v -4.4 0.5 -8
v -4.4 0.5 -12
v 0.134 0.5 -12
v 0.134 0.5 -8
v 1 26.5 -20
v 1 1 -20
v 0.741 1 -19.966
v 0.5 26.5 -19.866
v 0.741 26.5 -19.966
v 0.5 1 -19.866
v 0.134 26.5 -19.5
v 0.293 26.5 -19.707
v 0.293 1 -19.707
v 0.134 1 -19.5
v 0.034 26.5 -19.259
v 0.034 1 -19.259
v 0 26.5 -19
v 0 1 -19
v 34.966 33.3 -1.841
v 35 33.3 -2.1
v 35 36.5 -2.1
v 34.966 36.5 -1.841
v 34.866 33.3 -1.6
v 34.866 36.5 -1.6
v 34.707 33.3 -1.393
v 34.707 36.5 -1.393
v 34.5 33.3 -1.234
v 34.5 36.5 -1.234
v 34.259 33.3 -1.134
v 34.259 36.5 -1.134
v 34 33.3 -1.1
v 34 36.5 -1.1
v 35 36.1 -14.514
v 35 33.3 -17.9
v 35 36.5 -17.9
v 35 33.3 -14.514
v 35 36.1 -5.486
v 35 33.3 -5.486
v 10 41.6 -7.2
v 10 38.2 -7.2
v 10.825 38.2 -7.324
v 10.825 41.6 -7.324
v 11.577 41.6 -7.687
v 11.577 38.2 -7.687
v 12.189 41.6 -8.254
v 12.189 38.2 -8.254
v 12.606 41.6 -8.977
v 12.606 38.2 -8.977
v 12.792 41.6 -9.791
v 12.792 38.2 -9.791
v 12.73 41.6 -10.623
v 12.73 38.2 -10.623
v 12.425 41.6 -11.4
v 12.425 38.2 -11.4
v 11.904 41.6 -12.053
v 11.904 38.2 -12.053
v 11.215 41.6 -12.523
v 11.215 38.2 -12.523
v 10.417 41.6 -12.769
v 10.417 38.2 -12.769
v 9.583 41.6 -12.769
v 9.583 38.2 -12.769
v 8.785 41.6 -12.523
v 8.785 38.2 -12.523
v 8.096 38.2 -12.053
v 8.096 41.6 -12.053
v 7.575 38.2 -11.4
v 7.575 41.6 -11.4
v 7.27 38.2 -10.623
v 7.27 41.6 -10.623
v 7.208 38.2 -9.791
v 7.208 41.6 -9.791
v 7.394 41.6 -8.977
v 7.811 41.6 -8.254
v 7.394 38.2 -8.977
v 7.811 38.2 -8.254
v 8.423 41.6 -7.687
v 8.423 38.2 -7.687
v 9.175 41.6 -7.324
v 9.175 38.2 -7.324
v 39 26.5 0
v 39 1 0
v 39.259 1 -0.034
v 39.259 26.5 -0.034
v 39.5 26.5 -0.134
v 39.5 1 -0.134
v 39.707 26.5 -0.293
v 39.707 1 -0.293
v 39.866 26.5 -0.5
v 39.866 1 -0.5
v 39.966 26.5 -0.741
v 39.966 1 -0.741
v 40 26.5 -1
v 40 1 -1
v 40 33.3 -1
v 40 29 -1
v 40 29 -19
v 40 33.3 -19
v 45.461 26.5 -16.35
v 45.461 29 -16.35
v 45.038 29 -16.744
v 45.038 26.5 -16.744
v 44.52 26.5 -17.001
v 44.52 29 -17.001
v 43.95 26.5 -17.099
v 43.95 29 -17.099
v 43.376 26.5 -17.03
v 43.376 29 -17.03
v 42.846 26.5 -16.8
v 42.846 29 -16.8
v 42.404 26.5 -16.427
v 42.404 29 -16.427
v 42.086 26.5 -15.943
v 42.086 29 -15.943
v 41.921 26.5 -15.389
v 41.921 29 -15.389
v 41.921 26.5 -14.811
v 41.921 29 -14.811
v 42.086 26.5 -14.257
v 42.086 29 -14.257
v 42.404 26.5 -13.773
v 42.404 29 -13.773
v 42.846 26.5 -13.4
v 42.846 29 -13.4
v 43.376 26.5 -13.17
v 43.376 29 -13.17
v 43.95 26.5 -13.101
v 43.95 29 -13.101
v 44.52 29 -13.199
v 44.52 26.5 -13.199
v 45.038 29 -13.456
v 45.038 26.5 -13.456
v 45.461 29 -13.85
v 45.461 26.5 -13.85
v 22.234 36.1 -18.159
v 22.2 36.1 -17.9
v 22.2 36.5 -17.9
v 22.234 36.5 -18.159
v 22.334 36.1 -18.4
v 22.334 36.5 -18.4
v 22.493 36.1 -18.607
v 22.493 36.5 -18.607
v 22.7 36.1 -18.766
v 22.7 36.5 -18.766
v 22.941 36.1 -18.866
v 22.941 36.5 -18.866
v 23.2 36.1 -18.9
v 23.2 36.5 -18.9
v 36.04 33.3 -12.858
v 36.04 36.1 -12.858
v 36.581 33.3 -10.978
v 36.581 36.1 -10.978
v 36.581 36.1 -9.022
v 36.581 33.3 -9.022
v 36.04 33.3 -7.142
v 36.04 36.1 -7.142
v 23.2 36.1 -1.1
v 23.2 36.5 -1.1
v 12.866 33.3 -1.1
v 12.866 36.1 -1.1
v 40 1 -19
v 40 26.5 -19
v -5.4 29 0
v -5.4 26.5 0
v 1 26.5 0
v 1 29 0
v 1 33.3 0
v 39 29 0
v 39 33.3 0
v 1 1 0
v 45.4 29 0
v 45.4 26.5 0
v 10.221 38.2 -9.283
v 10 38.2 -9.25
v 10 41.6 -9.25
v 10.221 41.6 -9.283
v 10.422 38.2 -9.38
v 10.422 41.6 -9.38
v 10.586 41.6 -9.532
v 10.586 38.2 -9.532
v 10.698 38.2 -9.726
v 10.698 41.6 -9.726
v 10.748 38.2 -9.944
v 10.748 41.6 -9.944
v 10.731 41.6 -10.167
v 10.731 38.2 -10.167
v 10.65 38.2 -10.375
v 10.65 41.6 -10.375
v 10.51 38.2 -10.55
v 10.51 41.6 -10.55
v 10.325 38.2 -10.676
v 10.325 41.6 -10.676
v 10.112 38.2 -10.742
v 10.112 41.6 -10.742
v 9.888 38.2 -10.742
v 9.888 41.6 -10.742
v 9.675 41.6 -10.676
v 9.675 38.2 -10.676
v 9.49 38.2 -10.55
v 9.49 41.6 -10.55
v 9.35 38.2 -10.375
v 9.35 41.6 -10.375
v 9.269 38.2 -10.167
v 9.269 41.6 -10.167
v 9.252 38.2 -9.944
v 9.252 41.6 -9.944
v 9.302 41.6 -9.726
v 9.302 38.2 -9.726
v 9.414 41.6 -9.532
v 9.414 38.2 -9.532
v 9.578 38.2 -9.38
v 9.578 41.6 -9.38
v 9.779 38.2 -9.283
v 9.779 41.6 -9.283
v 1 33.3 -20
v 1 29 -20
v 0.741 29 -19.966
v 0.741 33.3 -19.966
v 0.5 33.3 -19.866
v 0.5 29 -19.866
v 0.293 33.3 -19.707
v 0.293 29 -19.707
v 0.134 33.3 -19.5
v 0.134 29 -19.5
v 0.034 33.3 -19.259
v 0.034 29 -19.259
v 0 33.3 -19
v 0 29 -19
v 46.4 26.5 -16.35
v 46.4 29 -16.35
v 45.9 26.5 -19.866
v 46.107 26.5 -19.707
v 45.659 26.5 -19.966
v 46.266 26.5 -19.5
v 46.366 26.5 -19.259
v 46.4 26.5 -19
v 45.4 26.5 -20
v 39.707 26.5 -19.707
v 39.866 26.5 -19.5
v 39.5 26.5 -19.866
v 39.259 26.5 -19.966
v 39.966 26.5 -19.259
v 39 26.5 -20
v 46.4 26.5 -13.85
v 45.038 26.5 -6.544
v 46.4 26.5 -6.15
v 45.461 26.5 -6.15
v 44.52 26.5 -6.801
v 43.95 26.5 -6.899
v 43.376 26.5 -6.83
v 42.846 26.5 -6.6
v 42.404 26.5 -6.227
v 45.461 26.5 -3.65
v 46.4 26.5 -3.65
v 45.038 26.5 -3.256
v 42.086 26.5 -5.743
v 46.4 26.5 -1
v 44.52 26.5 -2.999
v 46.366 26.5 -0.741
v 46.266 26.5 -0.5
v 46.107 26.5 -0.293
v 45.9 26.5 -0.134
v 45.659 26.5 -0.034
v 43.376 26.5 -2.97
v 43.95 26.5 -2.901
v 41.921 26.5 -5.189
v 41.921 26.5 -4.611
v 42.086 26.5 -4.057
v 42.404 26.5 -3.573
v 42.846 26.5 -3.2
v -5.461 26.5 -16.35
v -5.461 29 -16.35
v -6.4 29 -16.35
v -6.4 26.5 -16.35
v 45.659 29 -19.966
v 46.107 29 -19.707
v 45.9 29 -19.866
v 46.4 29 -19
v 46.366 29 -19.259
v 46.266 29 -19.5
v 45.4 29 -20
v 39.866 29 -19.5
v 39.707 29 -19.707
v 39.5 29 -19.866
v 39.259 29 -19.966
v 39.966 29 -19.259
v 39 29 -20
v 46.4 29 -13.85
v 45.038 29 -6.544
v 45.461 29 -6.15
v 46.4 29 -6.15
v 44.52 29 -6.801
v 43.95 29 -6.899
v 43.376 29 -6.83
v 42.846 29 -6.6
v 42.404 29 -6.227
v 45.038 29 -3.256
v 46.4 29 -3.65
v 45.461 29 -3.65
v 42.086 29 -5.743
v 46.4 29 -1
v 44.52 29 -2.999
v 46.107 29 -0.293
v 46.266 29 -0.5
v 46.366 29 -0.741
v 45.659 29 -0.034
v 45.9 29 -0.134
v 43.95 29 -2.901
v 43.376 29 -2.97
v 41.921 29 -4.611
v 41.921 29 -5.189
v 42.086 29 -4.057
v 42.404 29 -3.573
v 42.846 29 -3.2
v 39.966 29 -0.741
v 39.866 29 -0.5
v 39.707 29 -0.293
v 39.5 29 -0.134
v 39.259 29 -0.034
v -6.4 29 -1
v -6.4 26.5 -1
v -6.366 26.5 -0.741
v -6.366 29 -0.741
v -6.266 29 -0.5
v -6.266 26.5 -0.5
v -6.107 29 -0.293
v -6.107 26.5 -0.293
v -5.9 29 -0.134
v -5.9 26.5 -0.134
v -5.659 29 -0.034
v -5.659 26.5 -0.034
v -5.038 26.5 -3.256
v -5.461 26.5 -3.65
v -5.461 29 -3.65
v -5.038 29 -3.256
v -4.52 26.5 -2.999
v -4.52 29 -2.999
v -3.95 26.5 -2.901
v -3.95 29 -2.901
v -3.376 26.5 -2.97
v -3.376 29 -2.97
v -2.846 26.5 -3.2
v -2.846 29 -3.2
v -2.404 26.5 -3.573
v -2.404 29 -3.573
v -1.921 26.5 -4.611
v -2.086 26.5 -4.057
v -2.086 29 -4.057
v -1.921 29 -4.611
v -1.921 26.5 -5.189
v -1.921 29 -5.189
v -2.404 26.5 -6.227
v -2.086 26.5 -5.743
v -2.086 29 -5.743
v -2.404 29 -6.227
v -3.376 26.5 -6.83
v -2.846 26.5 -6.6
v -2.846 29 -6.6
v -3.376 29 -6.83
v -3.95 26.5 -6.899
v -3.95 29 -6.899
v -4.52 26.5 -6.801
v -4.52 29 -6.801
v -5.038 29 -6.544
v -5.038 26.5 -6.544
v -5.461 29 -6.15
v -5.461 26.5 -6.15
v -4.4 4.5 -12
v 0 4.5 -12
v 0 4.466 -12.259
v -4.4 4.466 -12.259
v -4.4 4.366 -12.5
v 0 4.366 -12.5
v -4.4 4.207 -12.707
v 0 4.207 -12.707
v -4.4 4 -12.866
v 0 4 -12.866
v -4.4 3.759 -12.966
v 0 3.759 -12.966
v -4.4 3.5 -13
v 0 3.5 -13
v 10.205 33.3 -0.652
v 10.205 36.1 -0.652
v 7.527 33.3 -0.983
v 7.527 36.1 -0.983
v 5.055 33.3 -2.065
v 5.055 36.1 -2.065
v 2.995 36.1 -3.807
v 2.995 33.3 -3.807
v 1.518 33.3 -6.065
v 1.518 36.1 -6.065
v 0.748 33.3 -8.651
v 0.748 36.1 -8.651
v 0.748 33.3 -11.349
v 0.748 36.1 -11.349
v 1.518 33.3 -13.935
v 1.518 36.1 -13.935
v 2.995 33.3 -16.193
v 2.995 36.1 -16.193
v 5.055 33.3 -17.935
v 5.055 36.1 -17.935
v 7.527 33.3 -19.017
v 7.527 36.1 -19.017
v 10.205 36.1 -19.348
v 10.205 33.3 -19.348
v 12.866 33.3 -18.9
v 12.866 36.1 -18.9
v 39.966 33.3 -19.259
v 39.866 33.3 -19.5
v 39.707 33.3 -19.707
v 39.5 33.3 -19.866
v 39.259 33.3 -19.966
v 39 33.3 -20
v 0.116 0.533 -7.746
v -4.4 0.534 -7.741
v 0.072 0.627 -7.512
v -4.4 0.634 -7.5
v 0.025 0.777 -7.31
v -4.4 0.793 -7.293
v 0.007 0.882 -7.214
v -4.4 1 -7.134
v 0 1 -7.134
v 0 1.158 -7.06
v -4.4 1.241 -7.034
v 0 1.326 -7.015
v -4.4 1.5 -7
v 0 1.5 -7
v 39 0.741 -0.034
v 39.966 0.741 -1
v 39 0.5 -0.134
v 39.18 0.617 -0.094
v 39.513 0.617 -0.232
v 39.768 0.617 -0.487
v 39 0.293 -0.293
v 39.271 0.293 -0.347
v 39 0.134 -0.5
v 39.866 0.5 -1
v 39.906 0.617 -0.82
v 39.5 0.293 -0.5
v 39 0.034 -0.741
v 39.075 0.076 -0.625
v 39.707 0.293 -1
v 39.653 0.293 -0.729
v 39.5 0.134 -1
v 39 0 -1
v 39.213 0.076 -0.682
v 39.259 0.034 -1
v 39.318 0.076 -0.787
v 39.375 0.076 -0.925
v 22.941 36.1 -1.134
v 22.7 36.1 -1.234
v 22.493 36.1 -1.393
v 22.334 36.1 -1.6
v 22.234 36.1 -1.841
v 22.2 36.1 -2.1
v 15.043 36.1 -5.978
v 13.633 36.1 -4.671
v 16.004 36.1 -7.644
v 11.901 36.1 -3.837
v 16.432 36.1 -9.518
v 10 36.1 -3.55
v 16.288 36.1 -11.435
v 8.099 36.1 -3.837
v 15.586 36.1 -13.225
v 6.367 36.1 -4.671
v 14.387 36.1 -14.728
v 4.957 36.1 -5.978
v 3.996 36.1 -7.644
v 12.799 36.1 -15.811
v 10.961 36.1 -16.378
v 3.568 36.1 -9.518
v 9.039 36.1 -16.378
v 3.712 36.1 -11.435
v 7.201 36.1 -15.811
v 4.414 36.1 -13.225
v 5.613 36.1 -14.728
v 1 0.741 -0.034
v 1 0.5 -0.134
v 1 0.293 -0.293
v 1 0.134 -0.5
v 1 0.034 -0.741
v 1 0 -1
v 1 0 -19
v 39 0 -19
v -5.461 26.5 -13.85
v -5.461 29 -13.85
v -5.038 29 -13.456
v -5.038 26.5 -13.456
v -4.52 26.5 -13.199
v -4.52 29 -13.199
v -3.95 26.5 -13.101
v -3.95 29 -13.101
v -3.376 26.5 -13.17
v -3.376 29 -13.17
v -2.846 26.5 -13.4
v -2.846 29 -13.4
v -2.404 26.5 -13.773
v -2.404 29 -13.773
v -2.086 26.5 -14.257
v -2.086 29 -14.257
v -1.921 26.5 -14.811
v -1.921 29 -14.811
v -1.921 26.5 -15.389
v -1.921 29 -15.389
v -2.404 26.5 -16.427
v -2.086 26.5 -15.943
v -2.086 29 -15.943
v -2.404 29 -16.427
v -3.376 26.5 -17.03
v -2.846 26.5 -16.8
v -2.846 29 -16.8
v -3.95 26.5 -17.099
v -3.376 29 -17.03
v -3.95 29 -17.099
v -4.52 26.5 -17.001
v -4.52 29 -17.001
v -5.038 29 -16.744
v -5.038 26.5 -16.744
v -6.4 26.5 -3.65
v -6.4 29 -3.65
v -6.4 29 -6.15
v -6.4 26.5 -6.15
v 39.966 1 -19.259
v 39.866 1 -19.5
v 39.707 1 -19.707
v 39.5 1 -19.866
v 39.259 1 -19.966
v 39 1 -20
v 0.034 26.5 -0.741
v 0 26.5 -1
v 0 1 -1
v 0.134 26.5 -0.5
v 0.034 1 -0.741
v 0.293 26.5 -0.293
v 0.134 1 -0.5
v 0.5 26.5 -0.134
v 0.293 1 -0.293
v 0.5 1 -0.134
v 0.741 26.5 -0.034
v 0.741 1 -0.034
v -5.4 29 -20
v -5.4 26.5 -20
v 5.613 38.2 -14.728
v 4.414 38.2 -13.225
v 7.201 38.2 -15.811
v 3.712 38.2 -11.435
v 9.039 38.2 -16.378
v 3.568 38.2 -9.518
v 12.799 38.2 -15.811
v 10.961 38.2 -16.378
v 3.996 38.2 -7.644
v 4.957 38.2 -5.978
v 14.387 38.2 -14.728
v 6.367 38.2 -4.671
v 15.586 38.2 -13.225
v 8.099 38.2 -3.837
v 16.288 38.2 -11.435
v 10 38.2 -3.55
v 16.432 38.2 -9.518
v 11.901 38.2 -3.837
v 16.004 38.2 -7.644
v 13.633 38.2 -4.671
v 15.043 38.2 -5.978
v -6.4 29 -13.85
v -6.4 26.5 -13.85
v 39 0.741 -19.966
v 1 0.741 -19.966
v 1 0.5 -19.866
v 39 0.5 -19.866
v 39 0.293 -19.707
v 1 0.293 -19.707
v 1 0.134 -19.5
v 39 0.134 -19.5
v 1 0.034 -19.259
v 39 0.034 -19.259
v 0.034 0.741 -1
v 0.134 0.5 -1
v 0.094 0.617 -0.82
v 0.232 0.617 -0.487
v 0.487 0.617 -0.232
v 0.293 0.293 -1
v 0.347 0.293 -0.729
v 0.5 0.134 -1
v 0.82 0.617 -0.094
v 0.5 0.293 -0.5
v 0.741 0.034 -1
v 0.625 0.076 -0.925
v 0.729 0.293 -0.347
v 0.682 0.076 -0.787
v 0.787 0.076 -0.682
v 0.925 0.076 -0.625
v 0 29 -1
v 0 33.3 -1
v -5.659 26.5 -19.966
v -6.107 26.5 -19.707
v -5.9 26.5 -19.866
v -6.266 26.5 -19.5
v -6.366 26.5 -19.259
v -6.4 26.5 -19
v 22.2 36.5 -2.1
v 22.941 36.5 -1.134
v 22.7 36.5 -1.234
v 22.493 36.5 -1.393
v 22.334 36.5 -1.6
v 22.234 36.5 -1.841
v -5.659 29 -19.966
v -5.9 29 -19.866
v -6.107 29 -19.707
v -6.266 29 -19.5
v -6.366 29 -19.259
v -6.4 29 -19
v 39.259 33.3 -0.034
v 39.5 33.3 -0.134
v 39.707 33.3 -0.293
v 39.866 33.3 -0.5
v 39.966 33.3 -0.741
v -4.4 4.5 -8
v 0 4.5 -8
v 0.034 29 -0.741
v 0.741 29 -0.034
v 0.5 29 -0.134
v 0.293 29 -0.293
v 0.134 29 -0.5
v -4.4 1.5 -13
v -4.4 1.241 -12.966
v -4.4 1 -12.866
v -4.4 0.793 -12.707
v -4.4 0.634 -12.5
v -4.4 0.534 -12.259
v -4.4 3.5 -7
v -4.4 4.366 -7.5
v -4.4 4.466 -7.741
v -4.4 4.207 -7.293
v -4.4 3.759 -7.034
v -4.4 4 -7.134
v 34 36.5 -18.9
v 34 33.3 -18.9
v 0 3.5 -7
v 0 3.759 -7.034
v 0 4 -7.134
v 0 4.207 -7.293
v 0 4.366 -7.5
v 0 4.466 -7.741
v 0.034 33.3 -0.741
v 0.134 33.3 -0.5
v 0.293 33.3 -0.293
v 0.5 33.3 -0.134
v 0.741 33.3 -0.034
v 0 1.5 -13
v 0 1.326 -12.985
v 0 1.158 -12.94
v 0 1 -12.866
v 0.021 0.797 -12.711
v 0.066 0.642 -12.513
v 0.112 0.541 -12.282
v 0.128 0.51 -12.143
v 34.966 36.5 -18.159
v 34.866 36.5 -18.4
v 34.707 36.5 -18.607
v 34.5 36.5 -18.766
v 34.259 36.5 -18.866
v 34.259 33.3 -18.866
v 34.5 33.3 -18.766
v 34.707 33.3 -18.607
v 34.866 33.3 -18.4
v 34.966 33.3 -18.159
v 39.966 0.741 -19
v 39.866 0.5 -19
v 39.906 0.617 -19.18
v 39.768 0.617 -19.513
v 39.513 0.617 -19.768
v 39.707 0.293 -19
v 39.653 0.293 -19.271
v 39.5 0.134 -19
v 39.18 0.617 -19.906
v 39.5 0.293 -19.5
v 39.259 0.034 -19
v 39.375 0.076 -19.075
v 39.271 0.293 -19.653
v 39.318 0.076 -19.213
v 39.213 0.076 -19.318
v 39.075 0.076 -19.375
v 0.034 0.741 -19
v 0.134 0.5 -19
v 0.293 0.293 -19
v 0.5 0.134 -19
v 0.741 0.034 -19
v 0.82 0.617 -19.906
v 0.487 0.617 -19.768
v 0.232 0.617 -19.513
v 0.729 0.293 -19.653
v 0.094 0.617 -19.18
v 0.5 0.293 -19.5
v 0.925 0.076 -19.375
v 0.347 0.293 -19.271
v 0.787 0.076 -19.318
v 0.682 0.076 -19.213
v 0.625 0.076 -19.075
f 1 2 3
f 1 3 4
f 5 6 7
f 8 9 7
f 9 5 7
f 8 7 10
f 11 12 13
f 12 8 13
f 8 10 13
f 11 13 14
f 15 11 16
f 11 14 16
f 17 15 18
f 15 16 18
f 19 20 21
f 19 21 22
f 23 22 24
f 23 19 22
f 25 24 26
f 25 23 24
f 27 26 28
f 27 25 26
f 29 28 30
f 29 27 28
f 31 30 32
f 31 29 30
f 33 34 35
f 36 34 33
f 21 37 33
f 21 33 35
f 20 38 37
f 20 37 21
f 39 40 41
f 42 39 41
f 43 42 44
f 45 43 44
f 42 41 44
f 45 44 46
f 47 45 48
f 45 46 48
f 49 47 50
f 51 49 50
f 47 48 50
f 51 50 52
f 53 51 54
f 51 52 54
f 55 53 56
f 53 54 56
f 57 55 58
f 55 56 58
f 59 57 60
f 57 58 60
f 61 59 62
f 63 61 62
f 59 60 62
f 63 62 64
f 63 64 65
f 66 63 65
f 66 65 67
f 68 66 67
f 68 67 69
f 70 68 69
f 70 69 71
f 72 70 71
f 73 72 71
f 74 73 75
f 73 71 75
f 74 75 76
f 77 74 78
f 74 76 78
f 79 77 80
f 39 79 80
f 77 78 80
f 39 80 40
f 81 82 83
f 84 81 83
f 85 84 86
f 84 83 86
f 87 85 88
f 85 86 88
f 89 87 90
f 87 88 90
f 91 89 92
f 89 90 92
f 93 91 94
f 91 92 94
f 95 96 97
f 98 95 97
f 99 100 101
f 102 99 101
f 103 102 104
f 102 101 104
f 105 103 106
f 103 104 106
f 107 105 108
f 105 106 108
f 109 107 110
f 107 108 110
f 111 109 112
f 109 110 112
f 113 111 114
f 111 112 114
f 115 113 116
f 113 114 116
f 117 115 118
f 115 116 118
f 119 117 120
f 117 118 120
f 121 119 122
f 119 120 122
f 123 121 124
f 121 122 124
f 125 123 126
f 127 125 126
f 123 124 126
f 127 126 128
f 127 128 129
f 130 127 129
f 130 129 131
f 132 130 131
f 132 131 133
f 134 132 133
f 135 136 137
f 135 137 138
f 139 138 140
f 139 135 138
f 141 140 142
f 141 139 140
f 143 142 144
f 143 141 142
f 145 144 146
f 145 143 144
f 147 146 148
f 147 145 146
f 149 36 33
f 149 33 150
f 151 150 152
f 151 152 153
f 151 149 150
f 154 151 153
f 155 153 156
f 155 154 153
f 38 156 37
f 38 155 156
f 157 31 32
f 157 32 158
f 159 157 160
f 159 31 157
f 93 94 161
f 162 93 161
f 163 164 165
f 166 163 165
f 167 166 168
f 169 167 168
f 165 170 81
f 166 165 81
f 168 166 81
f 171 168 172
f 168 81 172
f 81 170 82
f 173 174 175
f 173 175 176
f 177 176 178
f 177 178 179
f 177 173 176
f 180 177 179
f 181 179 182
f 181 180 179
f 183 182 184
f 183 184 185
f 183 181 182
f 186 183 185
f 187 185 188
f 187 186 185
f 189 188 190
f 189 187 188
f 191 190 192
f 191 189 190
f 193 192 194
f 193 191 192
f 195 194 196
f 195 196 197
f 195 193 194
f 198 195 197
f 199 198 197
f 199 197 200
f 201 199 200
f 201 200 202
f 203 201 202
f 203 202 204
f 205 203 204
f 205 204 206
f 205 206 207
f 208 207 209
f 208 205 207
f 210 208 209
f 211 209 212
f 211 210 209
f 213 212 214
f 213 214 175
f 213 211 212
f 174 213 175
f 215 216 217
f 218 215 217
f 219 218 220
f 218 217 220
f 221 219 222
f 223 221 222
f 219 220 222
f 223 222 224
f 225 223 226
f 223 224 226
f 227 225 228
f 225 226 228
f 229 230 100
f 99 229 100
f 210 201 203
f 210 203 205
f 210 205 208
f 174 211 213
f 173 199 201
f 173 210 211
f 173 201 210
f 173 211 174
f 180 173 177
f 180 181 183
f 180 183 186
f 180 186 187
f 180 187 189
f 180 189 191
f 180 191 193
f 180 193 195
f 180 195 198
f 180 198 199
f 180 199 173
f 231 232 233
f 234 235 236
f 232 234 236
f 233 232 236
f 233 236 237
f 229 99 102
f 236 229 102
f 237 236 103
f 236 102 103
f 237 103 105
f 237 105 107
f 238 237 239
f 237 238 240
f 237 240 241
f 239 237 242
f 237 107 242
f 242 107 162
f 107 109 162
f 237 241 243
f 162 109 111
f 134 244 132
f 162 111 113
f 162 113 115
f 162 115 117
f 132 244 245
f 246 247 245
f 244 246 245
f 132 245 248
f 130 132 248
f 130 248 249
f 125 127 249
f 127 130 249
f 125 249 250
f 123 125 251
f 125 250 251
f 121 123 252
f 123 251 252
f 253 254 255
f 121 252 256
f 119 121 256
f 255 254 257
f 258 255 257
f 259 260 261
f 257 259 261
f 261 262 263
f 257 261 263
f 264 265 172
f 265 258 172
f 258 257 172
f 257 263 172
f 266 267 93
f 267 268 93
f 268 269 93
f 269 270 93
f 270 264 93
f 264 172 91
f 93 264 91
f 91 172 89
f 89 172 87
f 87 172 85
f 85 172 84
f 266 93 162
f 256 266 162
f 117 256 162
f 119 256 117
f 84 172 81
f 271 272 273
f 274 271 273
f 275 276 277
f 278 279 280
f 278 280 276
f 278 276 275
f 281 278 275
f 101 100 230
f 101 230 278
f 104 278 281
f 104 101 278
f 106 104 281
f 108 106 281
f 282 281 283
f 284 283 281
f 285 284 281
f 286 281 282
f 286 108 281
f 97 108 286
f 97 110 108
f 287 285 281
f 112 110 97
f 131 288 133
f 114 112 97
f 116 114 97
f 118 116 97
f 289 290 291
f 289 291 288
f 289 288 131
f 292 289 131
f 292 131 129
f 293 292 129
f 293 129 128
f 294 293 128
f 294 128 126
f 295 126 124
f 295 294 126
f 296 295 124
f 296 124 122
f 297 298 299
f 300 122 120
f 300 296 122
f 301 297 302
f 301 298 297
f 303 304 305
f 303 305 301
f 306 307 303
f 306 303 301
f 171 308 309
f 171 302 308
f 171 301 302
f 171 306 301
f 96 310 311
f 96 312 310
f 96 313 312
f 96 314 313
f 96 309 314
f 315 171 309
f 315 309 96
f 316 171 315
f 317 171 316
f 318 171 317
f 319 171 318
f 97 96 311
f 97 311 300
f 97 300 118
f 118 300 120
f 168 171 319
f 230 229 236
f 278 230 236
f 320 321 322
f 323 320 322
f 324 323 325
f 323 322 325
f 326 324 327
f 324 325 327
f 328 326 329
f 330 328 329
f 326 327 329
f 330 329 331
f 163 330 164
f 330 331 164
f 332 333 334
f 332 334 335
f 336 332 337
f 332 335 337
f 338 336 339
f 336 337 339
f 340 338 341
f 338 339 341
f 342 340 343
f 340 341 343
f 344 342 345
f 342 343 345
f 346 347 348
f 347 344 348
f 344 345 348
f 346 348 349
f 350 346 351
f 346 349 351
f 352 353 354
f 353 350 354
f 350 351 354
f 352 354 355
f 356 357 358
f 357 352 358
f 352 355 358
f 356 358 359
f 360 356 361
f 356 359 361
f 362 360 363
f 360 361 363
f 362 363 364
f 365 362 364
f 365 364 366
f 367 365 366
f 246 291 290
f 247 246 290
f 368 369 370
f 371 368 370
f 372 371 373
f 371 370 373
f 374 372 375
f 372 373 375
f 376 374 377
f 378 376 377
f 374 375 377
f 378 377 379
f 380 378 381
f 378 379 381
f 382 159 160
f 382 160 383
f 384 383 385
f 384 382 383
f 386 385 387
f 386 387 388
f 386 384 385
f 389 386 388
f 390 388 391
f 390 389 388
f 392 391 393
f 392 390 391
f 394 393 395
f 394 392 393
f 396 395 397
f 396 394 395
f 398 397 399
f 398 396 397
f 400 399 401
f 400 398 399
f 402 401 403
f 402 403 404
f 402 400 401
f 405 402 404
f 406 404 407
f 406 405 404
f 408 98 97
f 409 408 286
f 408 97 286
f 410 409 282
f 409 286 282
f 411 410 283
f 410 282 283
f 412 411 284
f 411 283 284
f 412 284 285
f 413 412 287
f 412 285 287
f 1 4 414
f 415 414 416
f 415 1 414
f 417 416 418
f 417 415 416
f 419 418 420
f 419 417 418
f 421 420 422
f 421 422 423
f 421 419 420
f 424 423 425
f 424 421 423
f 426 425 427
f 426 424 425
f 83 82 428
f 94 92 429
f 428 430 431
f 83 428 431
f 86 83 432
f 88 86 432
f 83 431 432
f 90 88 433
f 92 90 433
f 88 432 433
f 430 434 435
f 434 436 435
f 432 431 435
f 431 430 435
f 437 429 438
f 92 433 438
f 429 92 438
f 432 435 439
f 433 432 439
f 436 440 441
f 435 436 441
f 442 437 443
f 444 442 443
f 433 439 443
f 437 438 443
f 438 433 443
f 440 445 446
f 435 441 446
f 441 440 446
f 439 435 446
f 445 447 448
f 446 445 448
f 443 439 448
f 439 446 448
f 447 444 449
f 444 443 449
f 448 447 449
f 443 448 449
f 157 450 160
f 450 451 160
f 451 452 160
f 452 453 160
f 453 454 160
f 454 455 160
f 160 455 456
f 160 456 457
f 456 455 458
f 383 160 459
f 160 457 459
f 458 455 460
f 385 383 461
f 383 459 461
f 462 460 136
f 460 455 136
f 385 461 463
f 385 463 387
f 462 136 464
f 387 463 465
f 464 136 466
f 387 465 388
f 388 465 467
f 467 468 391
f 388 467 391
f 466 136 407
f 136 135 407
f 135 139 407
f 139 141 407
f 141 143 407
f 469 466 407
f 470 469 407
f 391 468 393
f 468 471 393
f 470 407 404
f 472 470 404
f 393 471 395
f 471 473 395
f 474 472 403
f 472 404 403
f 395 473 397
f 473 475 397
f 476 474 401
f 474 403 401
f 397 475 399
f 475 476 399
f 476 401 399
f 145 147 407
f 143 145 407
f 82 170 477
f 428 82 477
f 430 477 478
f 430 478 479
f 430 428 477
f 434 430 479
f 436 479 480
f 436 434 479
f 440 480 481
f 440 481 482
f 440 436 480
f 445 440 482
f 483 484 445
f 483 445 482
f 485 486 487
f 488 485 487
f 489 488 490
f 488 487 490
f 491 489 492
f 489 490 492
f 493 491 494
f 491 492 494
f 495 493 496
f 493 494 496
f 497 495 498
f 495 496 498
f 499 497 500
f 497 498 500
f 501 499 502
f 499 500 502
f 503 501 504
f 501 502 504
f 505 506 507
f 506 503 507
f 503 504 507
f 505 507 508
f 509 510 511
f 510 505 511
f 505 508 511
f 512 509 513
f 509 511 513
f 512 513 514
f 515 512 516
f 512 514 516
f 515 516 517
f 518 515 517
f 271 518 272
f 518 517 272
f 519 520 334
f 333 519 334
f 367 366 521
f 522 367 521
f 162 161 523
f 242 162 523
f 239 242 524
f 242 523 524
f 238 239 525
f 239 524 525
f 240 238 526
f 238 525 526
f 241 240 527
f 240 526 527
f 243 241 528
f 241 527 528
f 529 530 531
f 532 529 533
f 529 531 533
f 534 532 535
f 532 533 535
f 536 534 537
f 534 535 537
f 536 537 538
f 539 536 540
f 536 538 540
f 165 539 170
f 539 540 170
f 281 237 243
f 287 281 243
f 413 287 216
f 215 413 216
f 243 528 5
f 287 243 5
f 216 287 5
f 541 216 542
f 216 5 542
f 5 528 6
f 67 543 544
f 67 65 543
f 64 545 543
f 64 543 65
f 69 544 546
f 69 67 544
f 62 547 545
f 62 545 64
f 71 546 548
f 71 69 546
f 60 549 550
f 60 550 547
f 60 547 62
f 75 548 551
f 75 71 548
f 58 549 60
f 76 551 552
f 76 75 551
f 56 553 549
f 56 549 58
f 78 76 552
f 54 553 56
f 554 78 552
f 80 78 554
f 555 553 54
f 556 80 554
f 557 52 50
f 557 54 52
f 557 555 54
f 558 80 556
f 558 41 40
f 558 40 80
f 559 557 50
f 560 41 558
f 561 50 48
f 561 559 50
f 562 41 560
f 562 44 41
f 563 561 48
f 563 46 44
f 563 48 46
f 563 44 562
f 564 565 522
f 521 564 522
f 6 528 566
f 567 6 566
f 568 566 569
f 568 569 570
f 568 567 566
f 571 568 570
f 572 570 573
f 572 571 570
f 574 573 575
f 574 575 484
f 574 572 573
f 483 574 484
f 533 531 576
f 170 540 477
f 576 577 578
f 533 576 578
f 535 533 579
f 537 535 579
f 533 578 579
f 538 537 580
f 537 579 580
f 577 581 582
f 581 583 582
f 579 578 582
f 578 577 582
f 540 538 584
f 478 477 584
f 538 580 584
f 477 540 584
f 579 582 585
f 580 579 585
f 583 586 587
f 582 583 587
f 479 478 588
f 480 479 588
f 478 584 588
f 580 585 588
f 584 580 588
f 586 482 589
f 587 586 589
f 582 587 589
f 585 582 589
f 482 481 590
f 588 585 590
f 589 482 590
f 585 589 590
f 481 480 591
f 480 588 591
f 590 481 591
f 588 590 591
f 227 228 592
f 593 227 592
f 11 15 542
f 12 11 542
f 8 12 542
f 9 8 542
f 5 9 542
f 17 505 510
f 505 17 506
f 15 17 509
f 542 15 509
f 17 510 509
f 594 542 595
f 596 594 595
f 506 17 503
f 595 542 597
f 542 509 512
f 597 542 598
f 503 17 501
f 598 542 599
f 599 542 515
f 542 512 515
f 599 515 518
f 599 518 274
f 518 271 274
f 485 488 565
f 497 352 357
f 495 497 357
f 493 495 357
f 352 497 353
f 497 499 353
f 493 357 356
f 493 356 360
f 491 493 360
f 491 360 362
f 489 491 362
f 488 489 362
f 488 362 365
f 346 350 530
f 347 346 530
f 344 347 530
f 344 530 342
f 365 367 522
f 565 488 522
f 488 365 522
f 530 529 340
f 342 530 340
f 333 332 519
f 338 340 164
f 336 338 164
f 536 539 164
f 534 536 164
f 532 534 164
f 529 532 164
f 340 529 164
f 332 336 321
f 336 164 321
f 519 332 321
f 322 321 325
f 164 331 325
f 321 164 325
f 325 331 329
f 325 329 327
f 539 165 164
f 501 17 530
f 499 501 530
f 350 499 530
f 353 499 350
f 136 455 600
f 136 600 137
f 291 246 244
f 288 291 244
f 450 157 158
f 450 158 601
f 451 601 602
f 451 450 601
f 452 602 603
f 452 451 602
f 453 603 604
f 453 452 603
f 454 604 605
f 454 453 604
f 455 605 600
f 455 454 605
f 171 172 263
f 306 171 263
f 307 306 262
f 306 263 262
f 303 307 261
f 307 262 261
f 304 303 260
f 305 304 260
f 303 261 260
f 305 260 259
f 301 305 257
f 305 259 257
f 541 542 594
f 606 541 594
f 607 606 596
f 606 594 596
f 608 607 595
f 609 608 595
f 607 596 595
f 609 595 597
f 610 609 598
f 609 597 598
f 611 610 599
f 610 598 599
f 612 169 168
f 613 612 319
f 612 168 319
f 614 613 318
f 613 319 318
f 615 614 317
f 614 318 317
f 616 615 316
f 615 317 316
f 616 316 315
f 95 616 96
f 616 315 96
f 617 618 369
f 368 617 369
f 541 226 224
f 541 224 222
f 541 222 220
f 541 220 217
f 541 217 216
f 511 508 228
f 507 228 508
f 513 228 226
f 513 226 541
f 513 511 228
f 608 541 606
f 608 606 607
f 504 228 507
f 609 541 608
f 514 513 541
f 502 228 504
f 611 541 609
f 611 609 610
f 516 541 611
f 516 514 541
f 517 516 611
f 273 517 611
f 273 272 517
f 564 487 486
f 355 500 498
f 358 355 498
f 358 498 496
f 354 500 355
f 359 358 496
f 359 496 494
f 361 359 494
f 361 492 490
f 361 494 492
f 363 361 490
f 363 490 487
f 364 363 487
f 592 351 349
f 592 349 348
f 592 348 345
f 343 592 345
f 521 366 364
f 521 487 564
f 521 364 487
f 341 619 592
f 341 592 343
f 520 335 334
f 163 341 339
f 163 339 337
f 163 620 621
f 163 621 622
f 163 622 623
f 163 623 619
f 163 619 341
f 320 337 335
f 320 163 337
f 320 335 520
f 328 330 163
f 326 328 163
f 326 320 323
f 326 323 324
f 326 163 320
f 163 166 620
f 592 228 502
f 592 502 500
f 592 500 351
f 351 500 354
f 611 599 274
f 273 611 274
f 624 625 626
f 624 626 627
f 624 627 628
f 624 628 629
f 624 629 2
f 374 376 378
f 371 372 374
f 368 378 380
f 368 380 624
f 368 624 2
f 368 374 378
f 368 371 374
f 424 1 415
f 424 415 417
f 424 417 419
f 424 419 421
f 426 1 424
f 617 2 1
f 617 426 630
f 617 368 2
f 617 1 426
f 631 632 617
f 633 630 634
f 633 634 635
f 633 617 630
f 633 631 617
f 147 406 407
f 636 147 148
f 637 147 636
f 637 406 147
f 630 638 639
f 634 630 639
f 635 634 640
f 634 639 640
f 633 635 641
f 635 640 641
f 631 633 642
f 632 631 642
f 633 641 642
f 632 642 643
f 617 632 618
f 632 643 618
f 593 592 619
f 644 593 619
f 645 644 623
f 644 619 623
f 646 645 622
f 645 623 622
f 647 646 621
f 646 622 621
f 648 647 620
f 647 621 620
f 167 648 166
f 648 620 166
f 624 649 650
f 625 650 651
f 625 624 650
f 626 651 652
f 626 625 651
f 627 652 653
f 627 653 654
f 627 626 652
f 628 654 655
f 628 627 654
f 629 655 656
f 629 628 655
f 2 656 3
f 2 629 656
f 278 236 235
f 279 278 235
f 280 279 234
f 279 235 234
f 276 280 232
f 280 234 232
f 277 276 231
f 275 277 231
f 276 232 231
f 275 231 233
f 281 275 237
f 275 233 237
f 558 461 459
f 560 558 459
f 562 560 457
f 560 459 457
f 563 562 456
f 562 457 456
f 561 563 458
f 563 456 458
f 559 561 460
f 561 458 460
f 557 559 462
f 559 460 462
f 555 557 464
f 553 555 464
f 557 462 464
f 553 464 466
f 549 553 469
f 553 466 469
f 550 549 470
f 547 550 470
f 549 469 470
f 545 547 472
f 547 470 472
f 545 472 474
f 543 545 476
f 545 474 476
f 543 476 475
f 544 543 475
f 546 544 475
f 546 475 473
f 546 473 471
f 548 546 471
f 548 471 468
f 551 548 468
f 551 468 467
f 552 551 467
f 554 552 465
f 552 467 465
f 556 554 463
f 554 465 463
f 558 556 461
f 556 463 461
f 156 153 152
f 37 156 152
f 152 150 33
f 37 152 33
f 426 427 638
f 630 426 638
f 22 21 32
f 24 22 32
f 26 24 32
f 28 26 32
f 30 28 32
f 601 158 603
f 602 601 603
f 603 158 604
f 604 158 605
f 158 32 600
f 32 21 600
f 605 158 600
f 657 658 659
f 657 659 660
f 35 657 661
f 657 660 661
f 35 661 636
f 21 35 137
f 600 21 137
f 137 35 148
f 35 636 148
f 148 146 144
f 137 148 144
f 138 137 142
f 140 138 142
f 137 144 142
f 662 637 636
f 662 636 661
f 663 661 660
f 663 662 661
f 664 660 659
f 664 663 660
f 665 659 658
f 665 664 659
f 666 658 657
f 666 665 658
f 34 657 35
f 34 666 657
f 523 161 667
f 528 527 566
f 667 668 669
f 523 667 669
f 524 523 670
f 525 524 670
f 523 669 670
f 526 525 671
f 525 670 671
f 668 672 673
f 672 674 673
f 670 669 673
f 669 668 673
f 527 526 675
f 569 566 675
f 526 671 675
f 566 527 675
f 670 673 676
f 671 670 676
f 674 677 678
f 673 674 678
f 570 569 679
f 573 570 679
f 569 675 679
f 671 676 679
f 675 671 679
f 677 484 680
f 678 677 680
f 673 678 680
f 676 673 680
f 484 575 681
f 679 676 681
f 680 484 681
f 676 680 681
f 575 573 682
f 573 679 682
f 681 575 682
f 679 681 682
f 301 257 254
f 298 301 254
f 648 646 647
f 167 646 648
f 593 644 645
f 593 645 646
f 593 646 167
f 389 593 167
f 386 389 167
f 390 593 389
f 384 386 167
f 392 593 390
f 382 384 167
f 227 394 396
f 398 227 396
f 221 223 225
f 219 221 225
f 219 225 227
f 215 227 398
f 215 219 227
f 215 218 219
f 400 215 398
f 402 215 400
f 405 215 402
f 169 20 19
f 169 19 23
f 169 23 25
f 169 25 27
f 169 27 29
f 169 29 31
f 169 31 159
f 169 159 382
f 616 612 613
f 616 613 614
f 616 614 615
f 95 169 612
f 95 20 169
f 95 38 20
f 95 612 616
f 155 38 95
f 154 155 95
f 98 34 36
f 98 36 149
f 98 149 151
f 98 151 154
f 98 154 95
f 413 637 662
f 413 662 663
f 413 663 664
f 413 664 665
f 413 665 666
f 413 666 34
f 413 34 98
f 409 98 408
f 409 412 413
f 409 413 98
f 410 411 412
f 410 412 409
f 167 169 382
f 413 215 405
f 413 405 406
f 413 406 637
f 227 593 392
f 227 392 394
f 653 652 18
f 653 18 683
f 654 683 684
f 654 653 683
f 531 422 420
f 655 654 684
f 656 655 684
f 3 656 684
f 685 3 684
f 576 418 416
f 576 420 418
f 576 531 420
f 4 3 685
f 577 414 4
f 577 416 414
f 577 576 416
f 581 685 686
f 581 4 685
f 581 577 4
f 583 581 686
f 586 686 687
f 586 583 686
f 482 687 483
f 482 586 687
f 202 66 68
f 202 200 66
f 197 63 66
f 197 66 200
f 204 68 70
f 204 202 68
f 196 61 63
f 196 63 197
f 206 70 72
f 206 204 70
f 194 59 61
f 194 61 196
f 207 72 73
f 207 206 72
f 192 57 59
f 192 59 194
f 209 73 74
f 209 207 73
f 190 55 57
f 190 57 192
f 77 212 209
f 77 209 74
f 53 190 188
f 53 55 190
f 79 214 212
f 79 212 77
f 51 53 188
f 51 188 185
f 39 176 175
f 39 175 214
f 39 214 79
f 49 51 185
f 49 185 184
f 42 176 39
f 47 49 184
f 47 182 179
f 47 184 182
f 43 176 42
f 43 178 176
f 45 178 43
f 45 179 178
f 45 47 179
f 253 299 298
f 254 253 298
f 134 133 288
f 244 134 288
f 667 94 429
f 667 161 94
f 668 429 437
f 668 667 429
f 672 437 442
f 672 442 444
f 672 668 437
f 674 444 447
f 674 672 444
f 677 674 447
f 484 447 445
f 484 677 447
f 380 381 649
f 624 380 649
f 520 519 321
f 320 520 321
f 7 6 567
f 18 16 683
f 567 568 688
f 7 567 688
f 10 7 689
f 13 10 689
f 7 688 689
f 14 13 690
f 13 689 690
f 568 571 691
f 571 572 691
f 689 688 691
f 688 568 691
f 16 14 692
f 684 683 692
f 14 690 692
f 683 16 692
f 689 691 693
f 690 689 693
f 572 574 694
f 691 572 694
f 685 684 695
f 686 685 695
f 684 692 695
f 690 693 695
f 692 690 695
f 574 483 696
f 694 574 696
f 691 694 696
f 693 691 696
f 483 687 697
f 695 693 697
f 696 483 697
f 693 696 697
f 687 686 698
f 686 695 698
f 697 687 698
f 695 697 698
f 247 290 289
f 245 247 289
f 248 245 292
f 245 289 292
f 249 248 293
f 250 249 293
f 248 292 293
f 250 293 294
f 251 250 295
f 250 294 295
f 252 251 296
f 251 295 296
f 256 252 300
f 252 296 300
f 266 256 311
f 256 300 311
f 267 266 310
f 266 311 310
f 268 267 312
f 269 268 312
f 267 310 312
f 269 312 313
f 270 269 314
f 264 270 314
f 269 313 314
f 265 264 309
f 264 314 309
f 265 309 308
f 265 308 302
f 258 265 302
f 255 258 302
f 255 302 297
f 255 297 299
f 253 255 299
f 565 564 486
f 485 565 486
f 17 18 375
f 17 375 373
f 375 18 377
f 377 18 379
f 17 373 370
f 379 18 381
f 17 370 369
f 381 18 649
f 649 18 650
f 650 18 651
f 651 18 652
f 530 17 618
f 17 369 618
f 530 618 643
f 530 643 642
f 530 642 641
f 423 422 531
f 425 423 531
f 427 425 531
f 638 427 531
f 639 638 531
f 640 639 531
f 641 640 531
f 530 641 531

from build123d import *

# Parameters (mm, degrees)
EXTRUDE_1_DEPTH             = 33.3
EXTRUDE_START               = -26.5
EXTRUDE_2_DEPTH             = 2.5
EXTRUDE_START_2             = -33.3
EXTRUDE_3_DEPTH             = 36.1
EXTRUDE_4_DEPTH             = 0.4
SKETCH_6_R                  = 6.45
EXTRUDE_5_DEPTH             = 2.1
SKETCH_7_R                  = 2.8
SKETCH_7_R_2                = 0.75
EXTRUDE_6_DEPTH             = 3.4
FILLET_1_R                  = 1
CUT_EXTRUDE_1_REACH         = 60.258
SKETCH_8_R                  = 2
EXTRUDE_7_DEPTH             = 4.4
EXTRUDE_7_DIRECTION_2_REACH = 67.449


with BuildPart() as part:
    # Эскиз1 → Вытянуть1 (new body)
    with BuildSketch(Plane(origin=(0, 0, 0), x_dir=(1, 0, 0), z_dir=(0, 1, 0))):
        with BuildLine():
            Line((1, 0), (39, 0))
            ThreePointArc((39, 0), (39.707106781, 0.292893219), (40, 1))
            Line((40, 1), (40, 19))
            ThreePointArc((40, 19), (39.707106781, 19.707106781), (39, 20))
            Line((39, 20), (1, 20))
            ThreePointArc((1, 20), (0.292893219, 19.707106781), (0, 19))
            Line((0, 19), (0, 1))
            ThreePointArc((0, 1), (0.292893219, 0.292893219), (1, 0))
        make_face()
    extrude(amount=EXTRUDE_1_DEPTH)

    # Эскиз2 → Вытянуть2 (add)
    with BuildSketch(Plane.XZ.offset(EXTRUDE_START)):
        with BuildLine():
            Line((-5.4, 0), (45.4, 0))
            ThreePointArc((45.4, 0), (46.107106781, -0.292893219), (46.4, -1))
            Line((46.4, -1), (46.4, -19))
            ThreePointArc((46.4, -19), (46.107106781, -19.707106781), (45.4, -20))
            Line((45.4, -20), (-5.4, -20))
            ThreePointArc((-5.4, -20), (-6.107106781, -19.707106781), (-6.4, -19))
            Line((-6.4, -19), (-6.4, -1))
            ThreePointArc((-6.4, -1), (-6.107106781, -0.292893219), (-5.4, 0))
        make_face()
    extrude(amount=-EXTRUDE_2_DEPTH)

    # Эскиз3 → Вытянуть3 (add)
    with BuildSketch(Plane(origin=(0, 33.3, 0), x_dir=(1, 0, 0), z_dir=(0, 1, 0)).offset(EXTRUDE_START_2)):
        with BuildLine():
            Line((12.865745976, 18.9), (34, 18.9))
            ThreePointArc((34, 18.9), (34.707106781, 18.607106781), (35, 17.9))
            Line((35, 17.9), (35, 14.514144437))
            ThreePointArc((35, 14.514144437), (36.65, 10), (35, 5.485855563))
            Line((35, 5.485855563), (35, 2.1))
            ThreePointArc((35, 2.1), (34.707106781, 1.392893219), (34, 1.1))
            Line((34, 1.1), (12.865745976, 1.1))
            ThreePointArc((12.865745976, 1.1), (0.65, 10), (12.865745976, 18.9))
        make_face()
    extrude(amount=EXTRUDE_3_DEPTH)

    # Эскиз5 → Вытянуть4 (add)
    with BuildSketch(Plane(origin=(0, 36.1, 0), x_dir=(1, 0, 0), z_dir=(0, 1, 0))):
        with BuildLine():
            Line((23.2, 18.9), (34, 18.9))
            ThreePointArc((34, 18.9), (34.707106781, 18.607106781), (35, 17.9))
            Line((35, 17.9), (35, 2.1))
            ThreePointArc((35, 2.1), (34.707106781, 1.392893219), (34, 1.1))
            Line((34, 1.1), (23.2, 1.1))
            ThreePointArc((23.2, 1.1), (22.492893219, 1.392893219), (22.2, 2.1))
            Line((22.2, 2.1), (22.2, 17.9))
            ThreePointArc((22.2, 17.9), (22.492893219, 18.607106781), (23.2, 18.9))
        make_face()
    extrude(amount=EXTRUDE_4_DEPTH)

    # Эскиз6 → Вытянуть5 (add)
    with BuildSketch(Plane(origin=(0, 36.1, 0), x_dir=(1, 0, 0), z_dir=(0, 1, 0))):
        with Locations(Location((10, 10, 0), (0, 0, 270))):
            Circle(SKETCH_6_R)
    extrude(amount=EXTRUDE_5_DEPTH)

    # Эскиз7 → Вытянуть6 (add)
    with BuildSketch(Plane(origin=(0, 38.2, 0), x_dir=(1, 0, 0), z_dir=(0, 1, 0))):
        with Locations(Location((10, 10, 0), (0, 0, 270))):
            Circle(SKETCH_7_R)
        with Locations(Location((10, 10, 0), (0, 0, 270))):
            Circle(SKETCH_7_R_2, mode=Mode.SUBTRACT)
    extrude(amount=EXTRUDE_6_DEPTH)

    # Скругление1
    fillet_1_edges = [part.edges().sort_by_distance(p)[0] for p in [
        (20, 0, -20),
        (39.707106781, 0, -19.707106781),
        (40, 0, -10),
        (39.707106781, 0, -0.292893219),
        (20, 0, 0),
        (0.292893219, 0, -0.292893219),
        (0, 0, -10),
        (0.292893219, 0, -19.707106781),
    ]]
    fillet(fillet_1_edges, radius=FILLET_1_R)

    # Эскиз8 → Вырез-Вытянуть1 (cut, up to next)
    with BuildSketch(Plane(origin=(0, 29, 0), x_dir=(1, 0, 0), z_dir=(0, 1, 0)), mode=Mode.PRIVATE) as cut_extrude_1_sk1:
        with Locations((-3.9, 4.9)):
            Circle(SKETCH_8_R)
    cut_extrude_1_tool1 = extrude(cut_extrude_1_sk1.sketch, amount=-CUT_EXTRUDE_1_REACH, mode=Mode.PRIVATE) & part.part
    # Эскиз8 → Вырез-Вытянуть1 (cut, up to next)
    with BuildSketch(Plane(origin=(0, 29, 0), x_dir=(1, 0, 0), z_dir=(0, 1, 0)), mode=Mode.PRIVATE) as cut_extrude_1_sk2:
        with Locations((-3.9, 15.1)):
            Circle(SKETCH_8_R)
    cut_extrude_1_tool2 = extrude(cut_extrude_1_sk2.sketch, amount=-CUT_EXTRUDE_1_REACH, mode=Mode.PRIVATE) & part.part
    # Эскиз8 → Вырез-Вытянуть1 (cut, up to next)
    with BuildSketch(Plane(origin=(0, 29, 0), x_dir=(1, 0, 0), z_dir=(0, 1, 0)), mode=Mode.PRIVATE) as cut_extrude_1_sk3:
        with Locations((43.9, 15.1)):
            Circle(SKETCH_8_R)
    cut_extrude_1_tool3 = extrude(cut_extrude_1_sk3.sketch, amount=-CUT_EXTRUDE_1_REACH, mode=Mode.PRIVATE) & part.part
    # Эскиз8 → Вырез-Вытянуть1 (cut, up to next)
    with BuildSketch(Plane(origin=(0, 29, 0), x_dir=(1, 0, 0), z_dir=(0, 1, 0)), mode=Mode.PRIVATE) as cut_extrude_1_sk4:
        with Locations((43.9, 4.9)):
            Circle(SKETCH_8_R)
    cut_extrude_1_tool4 = extrude(cut_extrude_1_sk4.sketch, amount=-CUT_EXTRUDE_1_REACH, mode=Mode.PRIVATE) & part.part
    # Эскиз8 → Вырез-Вытянуть1 (cut, up to next)
    with BuildSketch(Plane(origin=(0, 29, 0), x_dir=(1, 0, 0), z_dir=(0, 1, 0)), mode=Mode.PRIVATE) as cut_extrude_1_sk5:
        with BuildLine():
            ThreePointArc((-5.4612495, 13.85), (-5.9, 15.1), (-5.4612495, 16.35))
            Line((-5.4612495, 16.35), (-6.4, 16.35))
            Line((-6.4, 16.35), (-6.4, 13.85))
            Line((-6.4, 13.85), (-5.4612495, 13.85))
        make_face()
    cut_extrude_1_tool5 = extrude(cut_extrude_1_sk5.sketch, amount=-CUT_EXTRUDE_1_REACH, mode=Mode.PRIVATE) & part.part
    # Эскиз8 → Вырез-Вытянуть1 (cut, up to next)
    with BuildSketch(Plane(origin=(0, 29, 0), x_dir=(1, 0, 0), z_dir=(0, 1, 0)), mode=Mode.PRIVATE) as cut_extrude_1_sk6:
        with BuildLine():
            ThreePointArc((-1.9, 15.1), (-3.237617557, 16.987127314), (-5.4612495, 16.35))
            Line((-5.4612495, 16.35), (-5.4612495, 13.85))
            ThreePointArc((-5.4612495, 13.85), (-3.237617557, 13.212872686), (-1.9, 15.1))
        make_face()
    cut_extrude_1_tool6 = extrude(cut_extrude_1_sk6.sketch, amount=-CUT_EXTRUDE_1_REACH, mode=Mode.PRIVATE) & part.part
    # Эскиз8 → Вырез-Вытянуть1 (cut, up to next)
    with BuildSketch(Plane(origin=(0, 29, 0), x_dir=(1, 0, 0), z_dir=(0, 1, 0)), mode=Mode.PRIVATE) as cut_extrude_1_sk7:
        with BuildLine():
            Line((-5.4612495, 13.85), (-5.4612495, 16.35))
            ThreePointArc((-5.4612495, 16.35), (-5.9, 15.1), (-5.4612495, 13.85))
        make_face()
    cut_extrude_1_tool7 = extrude(cut_extrude_1_sk7.sketch, amount=-CUT_EXTRUDE_1_REACH, mode=Mode.PRIVATE) & part.part
    # Эскиз8 → Вырез-Вытянуть1 (cut, up to next)
    with BuildSketch(Plane(origin=(0, 29, 0), x_dir=(1, 0, 0), z_dir=(0, 1, 0)), mode=Mode.PRIVATE) as cut_extrude_1_sk8:
        with BuildLine():
            ThreePointArc((-1.9, 4.9), (-3.237617557, 6.787127314), (-5.4612495, 6.15))
            Line((-5.4612495, 6.15), (-5.4612495, 3.65))
            ThreePointArc((-5.4612495, 3.65), (-3.237617557, 3.012872686), (-1.9, 4.9))
        make_face()
    cut_extrude_1_tool8 = extrude(cut_extrude_1_sk8.sketch, amount=-CUT_EXTRUDE_1_REACH, mode=Mode.PRIVATE) & part.part
    # Эскиз8 → Вырез-Вытянуть1 (cut, up to next)
    with BuildSketch(Plane(origin=(0, 29, 0), x_dir=(1, 0, 0), z_dir=(0, 1, 0)), mode=Mode.PRIVATE) as cut_extrude_1_sk9:
        with BuildLine():
            Line((-5.4612495, 3.65), (-5.4612495, 6.15))
            ThreePointArc((-5.4612495, 6.15), (-5.9, 4.9), (-5.4612495, 3.65))
        make_face()
    cut_extrude_1_tool9 = extrude(cut_extrude_1_sk9.sketch, amount=-CUT_EXTRUDE_1_REACH, mode=Mode.PRIVATE) & part.part
    # Эскиз8 → Вырез-Вытянуть1 (cut, up to next)
    with BuildSketch(Plane(origin=(0, 29, 0), x_dir=(1, 0, 0), z_dir=(0, 1, 0)), mode=Mode.PRIVATE) as cut_extrude_1_sk10:
        with BuildLine():
            Line((-5.4612495, 6.15), (-6.4, 6.15))
            Line((-6.4, 6.15), (-6.4, 3.65))
            Line((-6.4, 3.65), (-5.4612495, 3.65))
            ThreePointArc((-5.4612495, 3.65), (-5.9, 4.9), (-5.4612495, 6.15))
        make_face()
    cut_extrude_1_tool10 = extrude(cut_extrude_1_sk10.sketch, amount=-CUT_EXTRUDE_1_REACH, mode=Mode.PRIVATE) & part.part
    # Эскиз8 → Вырез-Вытянуть1 (cut, up to next)
    with BuildSketch(Plane(origin=(0, 29, 0), x_dir=(1, 0, 0), z_dir=(0, 1, 0)), mode=Mode.PRIVATE) as cut_extrude_1_sk11:
        with BuildLine():
            ThreePointArc((45.9, 15.1), (45.787127314, 15.762382443), (45.4612495, 16.35))
            Line((45.4612495, 16.35), (45.4612495, 13.85))
            ThreePointArc((45.4612495, 13.85), (45.787127314, 14.437617557), (45.9, 15.1))
        make_face()
    cut_extrude_1_tool11 = extrude(cut_extrude_1_sk11.sketch, amount=-CUT_EXTRUDE_1_REACH, mode=Mode.PRIVATE) & part.part
    # Эскиз8 → Вырез-Вытянуть1 (cut, up to next)
    with BuildSketch(Plane(origin=(0, 29, 0), x_dir=(1, 0, 0), z_dir=(0, 1, 0)), mode=Mode.PRIVATE) as cut_extrude_1_sk12:
        with BuildLine():
            Line((45.4612495, 13.85), (45.4612495, 16.35))
            ThreePointArc((45.4612495, 16.35), (41.9, 15.1), (45.4612495, 13.85))
        make_face()
    cut_extrude_1_tool12 = extrude(cut_extrude_1_sk12.sketch, amount=-CUT_EXTRUDE_1_REACH, mode=Mode.PRIVATE) & part.part
    # Эскиз8 → Вырез-Вытянуть1 (cut, up to next)
    with BuildSketch(Plane(origin=(0, 29, 0), x_dir=(1, 0, 0), z_dir=(0, 1, 0)), mode=Mode.PRIVATE) as cut_extrude_1_sk13:
        with BuildLine():
            Line((46.4, 16.35), (45.4612495, 16.35))
            ThreePointArc((45.4612495, 16.35), (45.787127314, 15.762382443), (45.9, 15.1))
            ThreePointArc((45.9, 15.1), (45.787127314, 14.437617557), (45.4612495, 13.85))
            Line((45.4612495, 13.85), (46.4, 13.85))
            Line((46.4, 13.85), (46.4, 16.35))
        make_face()
    cut_extrude_1_tool13 = extrude(cut_extrude_1_sk13.sketch, amount=-CUT_EXTRUDE_1_REACH, mode=Mode.PRIVATE) & part.part
    # Эскиз8 → Вырез-Вытянуть1 (cut, up to next)
    with BuildSketch(Plane(origin=(0, 29, 0), x_dir=(1, 0, 0), z_dir=(0, 1, 0)), mode=Mode.PRIVATE) as cut_extrude_1_sk14:
        with BuildLine():
            ThreePointArc((45.9, 4.9), (45.787127314, 5.562382443), (45.4612495, 6.15))
            Line((45.4612495, 6.15), (45.4612495, 3.65))
            ThreePointArc((45.4612495, 3.65), (45.787127314, 4.237617557), (45.9, 4.9))
        make_face()
    cut_extrude_1_tool14 = extrude(cut_extrude_1_sk14.sketch, amount=-CUT_EXTRUDE_1_REACH, mode=Mode.PRIVATE) & part.part
    # Эскиз8 → Вырез-Вытянуть1 (cut, up to next)
    with BuildSketch(Plane(origin=(0, 29, 0), x_dir=(1, 0, 0), z_dir=(0, 1, 0)), mode=Mode.PRIVATE) as cut_extrude_1_sk15:
        with BuildLine():
            Line((45.4612495, 3.65), (45.4612495, 6.15))
            ThreePointArc((45.4612495, 6.15), (41.9, 4.9), (45.4612495, 3.65))
        make_face()
    cut_extrude_1_tool15 = extrude(cut_extrude_1_sk15.sketch, amount=-CUT_EXTRUDE_1_REACH, mode=Mode.PRIVATE) & part.part
    # Эскиз8 → Вырез-Вытянуть1 (cut, up to next)
    with BuildSketch(Plane(origin=(0, 29, 0), x_dir=(1, 0, 0), z_dir=(0, 1, 0)), mode=Mode.PRIVATE) as cut_extrude_1_sk16:
        with BuildLine():
            Line((46.4, 6.15), (45.4612495, 6.15))
            ThreePointArc((45.4612495, 6.15), (45.787127314, 5.562382443), (45.9, 4.9))
            ThreePointArc((45.9, 4.9), (45.787127314, 4.237617557), (45.4612495, 3.65))
            Line((45.4612495, 3.65), (46.4, 3.65))
            Line((46.4, 3.65), (46.4, 6.15))
        make_face()
    cut_extrude_1_tool16 = extrude(cut_extrude_1_sk16.sketch, amount=-CUT_EXTRUDE_1_REACH, mode=Mode.PRIVATE) & part.part
    add(cut_extrude_1_tool1.solids().sort_by_distance((-3.9, 29, -4.9))[0], mode=Mode.SUBTRACT)
    add(cut_extrude_1_tool2.solids().sort_by_distance((-3.9, 29, -15.1))[0], mode=Mode.SUBTRACT)
    add(cut_extrude_1_tool3.solids().sort_by_distance((43.9, 29, -15.1))[0], mode=Mode.SUBTRACT)
    add(cut_extrude_1_tool4.solids().sort_by_distance((43.9, 29, -4.9))[0], mode=Mode.SUBTRACT)
    add(cut_extrude_1_tool5.solids().sort_by_distance((-6.067542, 29, -15.1))[0], mode=Mode.SUBTRACT)
    add(cut_extrude_1_tool6.solids().sort_by_distance((-3.789816, 29, -15.1))[0], mode=Mode.SUBTRACT)
    add(cut_extrude_1_tool7.solids().sort_by_distance((-5.638512, 29, -15.1))[0], mode=Mode.SUBTRACT)
    add(cut_extrude_1_tool8.solids().sort_by_distance((-3.789816, 29, -4.9))[0], mode=Mode.SUBTRACT)
    add(cut_extrude_1_tool9.solids().sort_by_distance((-5.638512, 29, -4.9))[0], mode=Mode.SUBTRACT)
    add(cut_extrude_1_tool10.solids().sort_by_distance((-6.067542, 29, -4.9))[0], mode=Mode.SUBTRACT)
    add(cut_extrude_1_tool11.solids().sort_by_distance((45.638512, 29, -15.1))[0], mode=Mode.SUBTRACT)
    add(cut_extrude_1_tool12.solids().sort_by_distance((43.789816, 29, -15.1))[0], mode=Mode.SUBTRACT)
    add(cut_extrude_1_tool13.solids().sort_by_distance((46.067542, 29, -15.1))[0], mode=Mode.SUBTRACT)
    add(cut_extrude_1_tool14.solids().sort_by_distance((45.638512, 29, -4.9))[0], mode=Mode.SUBTRACT)
    add(cut_extrude_1_tool15.solids().sort_by_distance((43.789816, 29, -4.9))[0], mode=Mode.SUBTRACT)
    add(cut_extrude_1_tool16.solids().sort_by_distance((46.067542, 29, -4.9))[0], mode=Mode.SUBTRACT)

    # Эскиз10 → Вытянуть7 (add)
    with BuildSketch(Plane.ZY):
        with BuildLine():
            Line((-12, 0.5), (-8, 0.5))
            ThreePointArc((-8, 0.5), (-7.292893219, 0.792893219), (-7, 1.5))
            Line((-7, 1.5), (-7, 3.5))
            ThreePointArc((-7, 3.5), (-7.292893219, 4.207106781), (-8, 4.5))
            Line((-8, 4.5), (-12, 4.5))
            ThreePointArc((-12, 4.5), (-12.707106781, 4.207106781), (-13, 3.5))
            Line((-13, 3.5), (-13, 1.5))
            ThreePointArc((-13, 1.5), (-12.707106781, 0.792893219), (-12, 0.5))
        make_face()
    extrude(amount=EXTRUDE_7_DEPTH)

    # Эскиз10 → Вытянуть7 direction 2 (add, up to next)
    with BuildSketch(Plane.ZY, mode=Mode.PRIVATE) as extrude_7_direction_2_sk1:
        with BuildLine():
            Line((-12, 0.5), (-8, 0.5))
            ThreePointArc((-8, 0.5), (-7.292893219, 0.792893219), (-7, 1.5))
            Line((-7, 1.5), (-7, 3.5))
            ThreePointArc((-7, 3.5), (-7.292893219, 4.207106781), (-8, 4.5))
            Line((-8, 4.5), (-12, 4.5))
            ThreePointArc((-12, 4.5), (-12.707106781, 4.207106781), (-13, 3.5))
            Line((-13, 3.5), (-13, 1.5))
            ThreePointArc((-13, 1.5), (-12.707106781, 0.792893219), (-12, 0.5))
        make_face()
    extrude_7_direction_2_tool1 = extrude(extrude_7_direction_2_sk1.sketch, amount=-EXTRUDE_7_DIRECTION_2_REACH, mode=Mode.PRIVATE) - part.part
    add(extrude_7_direction_2_tool1.solids().sort_by_distance((0, 2.5, -10))[0])


solid = part.part
